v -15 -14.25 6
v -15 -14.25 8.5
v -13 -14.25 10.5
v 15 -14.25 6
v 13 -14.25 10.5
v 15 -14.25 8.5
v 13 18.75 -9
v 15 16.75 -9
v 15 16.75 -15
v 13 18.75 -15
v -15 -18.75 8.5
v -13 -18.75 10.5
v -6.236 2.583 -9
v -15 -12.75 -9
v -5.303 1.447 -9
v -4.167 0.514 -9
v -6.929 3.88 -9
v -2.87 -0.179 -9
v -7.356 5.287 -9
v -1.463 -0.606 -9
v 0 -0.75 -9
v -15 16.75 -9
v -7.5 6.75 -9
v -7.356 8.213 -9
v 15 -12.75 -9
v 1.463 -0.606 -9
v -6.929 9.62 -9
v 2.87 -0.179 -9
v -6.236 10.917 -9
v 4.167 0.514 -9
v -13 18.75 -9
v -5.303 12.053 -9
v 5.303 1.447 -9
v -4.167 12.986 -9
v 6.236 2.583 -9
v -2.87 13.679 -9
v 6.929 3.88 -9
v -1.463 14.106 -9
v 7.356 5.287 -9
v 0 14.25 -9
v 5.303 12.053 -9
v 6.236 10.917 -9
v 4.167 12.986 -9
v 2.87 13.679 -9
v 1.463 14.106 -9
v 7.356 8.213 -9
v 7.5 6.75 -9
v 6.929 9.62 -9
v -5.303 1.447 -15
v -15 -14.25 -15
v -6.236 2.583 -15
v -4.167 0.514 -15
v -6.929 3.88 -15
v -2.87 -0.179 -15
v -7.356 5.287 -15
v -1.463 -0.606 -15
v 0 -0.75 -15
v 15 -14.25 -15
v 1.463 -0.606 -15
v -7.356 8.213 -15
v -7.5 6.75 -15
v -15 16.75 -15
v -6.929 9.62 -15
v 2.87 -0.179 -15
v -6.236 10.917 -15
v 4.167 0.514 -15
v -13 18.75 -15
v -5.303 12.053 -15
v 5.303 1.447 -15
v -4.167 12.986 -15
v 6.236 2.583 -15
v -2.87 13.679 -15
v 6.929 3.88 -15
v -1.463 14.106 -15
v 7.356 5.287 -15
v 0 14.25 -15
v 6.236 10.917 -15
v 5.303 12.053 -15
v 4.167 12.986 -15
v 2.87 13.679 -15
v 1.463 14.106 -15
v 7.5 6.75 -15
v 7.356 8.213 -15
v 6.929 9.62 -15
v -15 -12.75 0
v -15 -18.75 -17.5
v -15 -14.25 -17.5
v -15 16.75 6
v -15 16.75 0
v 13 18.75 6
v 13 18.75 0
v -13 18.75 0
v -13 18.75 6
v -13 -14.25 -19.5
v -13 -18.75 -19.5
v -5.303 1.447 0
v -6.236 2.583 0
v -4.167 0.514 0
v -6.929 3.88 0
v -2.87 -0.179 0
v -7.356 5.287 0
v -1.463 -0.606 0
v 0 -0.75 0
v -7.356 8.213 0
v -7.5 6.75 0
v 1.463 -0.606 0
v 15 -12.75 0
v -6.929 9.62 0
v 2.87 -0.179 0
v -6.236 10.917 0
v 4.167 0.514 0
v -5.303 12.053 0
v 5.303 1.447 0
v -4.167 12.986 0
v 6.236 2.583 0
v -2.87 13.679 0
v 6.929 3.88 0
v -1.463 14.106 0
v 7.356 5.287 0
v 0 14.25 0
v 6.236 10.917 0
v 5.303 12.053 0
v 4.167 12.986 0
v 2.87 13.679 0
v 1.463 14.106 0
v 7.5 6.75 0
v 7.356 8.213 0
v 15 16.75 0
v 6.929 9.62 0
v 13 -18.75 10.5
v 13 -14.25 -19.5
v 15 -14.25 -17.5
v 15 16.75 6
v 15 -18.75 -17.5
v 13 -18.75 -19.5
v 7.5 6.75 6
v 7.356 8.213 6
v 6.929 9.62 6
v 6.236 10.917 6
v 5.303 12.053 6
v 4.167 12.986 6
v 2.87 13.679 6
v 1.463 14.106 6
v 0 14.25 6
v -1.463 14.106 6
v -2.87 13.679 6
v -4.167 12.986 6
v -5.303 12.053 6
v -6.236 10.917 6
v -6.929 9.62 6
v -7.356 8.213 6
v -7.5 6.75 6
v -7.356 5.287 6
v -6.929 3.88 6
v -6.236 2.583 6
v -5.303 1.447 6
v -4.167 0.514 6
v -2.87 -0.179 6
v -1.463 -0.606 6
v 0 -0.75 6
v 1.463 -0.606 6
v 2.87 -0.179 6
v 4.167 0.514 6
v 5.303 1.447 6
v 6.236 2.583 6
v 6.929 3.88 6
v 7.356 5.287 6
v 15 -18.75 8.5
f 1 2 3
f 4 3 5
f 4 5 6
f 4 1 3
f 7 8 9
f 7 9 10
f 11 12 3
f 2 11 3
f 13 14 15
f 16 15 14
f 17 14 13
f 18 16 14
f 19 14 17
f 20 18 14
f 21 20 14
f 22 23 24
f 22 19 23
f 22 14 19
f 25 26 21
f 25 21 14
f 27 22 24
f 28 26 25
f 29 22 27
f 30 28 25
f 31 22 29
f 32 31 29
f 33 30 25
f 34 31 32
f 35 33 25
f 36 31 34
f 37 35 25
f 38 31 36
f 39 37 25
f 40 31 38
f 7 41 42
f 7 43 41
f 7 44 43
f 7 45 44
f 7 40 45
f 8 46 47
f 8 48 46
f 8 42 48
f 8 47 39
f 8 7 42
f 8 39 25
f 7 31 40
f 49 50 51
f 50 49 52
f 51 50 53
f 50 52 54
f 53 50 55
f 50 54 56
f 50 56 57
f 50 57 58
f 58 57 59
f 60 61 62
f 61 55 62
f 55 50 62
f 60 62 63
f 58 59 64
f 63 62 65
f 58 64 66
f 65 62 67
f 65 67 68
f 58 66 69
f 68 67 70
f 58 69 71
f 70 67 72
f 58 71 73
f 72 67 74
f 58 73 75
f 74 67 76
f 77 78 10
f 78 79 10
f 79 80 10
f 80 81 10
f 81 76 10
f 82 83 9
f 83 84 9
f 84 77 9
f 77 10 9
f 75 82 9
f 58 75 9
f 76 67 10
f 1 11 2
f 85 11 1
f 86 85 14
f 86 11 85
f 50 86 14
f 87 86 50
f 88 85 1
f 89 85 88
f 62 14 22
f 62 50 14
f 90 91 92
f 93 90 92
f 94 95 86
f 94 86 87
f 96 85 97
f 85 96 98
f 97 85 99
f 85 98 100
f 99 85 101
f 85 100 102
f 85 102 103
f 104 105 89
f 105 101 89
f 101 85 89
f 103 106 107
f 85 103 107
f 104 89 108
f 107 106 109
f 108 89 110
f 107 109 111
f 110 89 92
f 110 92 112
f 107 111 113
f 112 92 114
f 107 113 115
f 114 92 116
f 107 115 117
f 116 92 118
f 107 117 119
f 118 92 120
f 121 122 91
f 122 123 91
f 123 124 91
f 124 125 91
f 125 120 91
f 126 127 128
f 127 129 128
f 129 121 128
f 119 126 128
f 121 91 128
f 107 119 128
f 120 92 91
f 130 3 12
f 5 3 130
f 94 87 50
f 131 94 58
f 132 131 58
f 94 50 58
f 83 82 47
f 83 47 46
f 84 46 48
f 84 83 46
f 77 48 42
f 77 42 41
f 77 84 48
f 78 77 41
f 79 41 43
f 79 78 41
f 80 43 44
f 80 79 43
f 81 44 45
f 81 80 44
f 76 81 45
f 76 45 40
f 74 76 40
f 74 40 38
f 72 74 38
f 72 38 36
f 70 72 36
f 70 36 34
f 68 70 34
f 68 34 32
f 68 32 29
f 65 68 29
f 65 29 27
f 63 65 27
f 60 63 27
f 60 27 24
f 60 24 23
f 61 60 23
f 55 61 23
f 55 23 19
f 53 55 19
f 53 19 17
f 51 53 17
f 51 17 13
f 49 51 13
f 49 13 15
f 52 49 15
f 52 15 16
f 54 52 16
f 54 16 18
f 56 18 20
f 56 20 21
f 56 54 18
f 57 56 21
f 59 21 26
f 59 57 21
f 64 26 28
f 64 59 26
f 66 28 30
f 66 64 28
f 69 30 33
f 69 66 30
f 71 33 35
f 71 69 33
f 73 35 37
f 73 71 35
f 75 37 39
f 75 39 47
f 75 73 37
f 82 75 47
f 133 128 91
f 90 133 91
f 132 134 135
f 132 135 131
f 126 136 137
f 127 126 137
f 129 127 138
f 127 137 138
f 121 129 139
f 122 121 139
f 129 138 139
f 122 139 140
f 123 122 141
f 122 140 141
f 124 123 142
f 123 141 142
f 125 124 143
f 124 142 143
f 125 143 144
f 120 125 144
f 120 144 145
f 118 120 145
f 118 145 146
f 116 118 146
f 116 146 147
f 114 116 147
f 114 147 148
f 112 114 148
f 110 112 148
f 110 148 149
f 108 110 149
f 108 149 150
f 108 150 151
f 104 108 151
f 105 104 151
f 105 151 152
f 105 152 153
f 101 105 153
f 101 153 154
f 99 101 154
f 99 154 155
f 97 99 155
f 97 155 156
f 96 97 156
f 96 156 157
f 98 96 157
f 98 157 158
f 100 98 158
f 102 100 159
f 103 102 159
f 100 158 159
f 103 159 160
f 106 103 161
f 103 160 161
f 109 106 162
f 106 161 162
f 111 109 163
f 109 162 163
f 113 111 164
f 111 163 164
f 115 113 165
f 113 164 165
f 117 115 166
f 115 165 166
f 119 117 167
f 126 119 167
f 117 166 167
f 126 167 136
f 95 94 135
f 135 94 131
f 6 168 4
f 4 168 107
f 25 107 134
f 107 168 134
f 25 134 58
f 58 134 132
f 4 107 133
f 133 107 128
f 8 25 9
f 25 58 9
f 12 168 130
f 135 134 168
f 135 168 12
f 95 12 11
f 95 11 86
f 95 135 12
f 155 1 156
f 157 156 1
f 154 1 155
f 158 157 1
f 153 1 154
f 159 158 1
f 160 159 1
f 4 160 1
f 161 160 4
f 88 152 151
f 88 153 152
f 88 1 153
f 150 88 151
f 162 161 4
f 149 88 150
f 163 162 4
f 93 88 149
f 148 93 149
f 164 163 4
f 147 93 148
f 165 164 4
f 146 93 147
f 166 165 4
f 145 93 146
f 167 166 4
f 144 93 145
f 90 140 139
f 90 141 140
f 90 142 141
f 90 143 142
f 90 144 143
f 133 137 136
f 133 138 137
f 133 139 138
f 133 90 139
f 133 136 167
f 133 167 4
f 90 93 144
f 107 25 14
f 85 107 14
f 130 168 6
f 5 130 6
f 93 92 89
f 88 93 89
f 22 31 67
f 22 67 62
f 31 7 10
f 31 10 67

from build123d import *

# Parameters (mm, degrees)
EXTRUDE_1_DEPTH            = 6
SKETCH_8_W                 = 30
SKETCH_8_H                 = 4.5
EXTRUDE_4_DEPTH            = 4.5
CHAMFER_1_SIZE             = 2
CHAMFER_2_SIZE             = 2
CUT_EXTRUDE_2_REACH        = 26.75
SKETCH_8_5_R               = 7.5
SKETCH_13_W                = 30
SKETCH_13_H                = 6
EXTRUDE_5_DEPTH            = 4.5
CHAMFER_1_OF_MIRROR_4_SIZE = 2
CHAMFER_2_OF_MIRROR_4_SIZE = 2


with BuildPart() as part:
    # 草图1 → 凸台-拉伸1 (new body)
    with BuildSketch(Plane.XY):
        Polygon((-13, 18.75), (-15, 16.75), (-15, -18.75), (15, -18.75), (15, 16.75), (13, 18.75), align=None)
    extrude_1 = extrude(amount=EXTRUDE_1_DEPTH)

    # 草图8 → 凸台-拉伸4 (add)
    with BuildSketch(Plane.XY.offset(6)):
        with Locations((0, -16.5)):
            Rectangle(SKETCH_8_W, SKETCH_8_H)
    extrude_4 = extrude(amount=EXTRUDE_4_DEPTH)

    # 倒角1
    chamfer_1_edges = [part.edges().sort_by_distance(p)[0] for p in [
        (-15, -16.5, 10.5),
    ]]
    chamfer(chamfer_1_edges, length=CHAMFER_1_SIZE)

    # 倒角2
    chamfer_2_edges = [part.edges().sort_by_distance(p)[0] for p in [
        (15, -16.5, 10.5),
    ]]
    chamfer(chamfer_2_edges, length=CHAMFER_2_SIZE)

    # 草图8<5> → 切除-拉伸2 (cut, up to next)
    with BuildSketch(Plane.XY.offset(6), mode=Mode.PRIVATE) as cut_extrude_2_sk1:
        with Locations((0, 6.75)):
            Circle(SKETCH_8_5_R)
    cut_extrude_2_tool1 = extrude(cut_extrude_2_sk1.sketch, amount=-CUT_EXTRUDE_2_REACH, mode=Mode.PRIVATE) & part.part
    cut_extrude_2 = cut_extrude_2_tool1.solids().sort_by_distance((0, 6.75, 6))[0]
    add(cut_extrude_2, mode=Mode.SUBTRACT)

    # 草图13 → 凸台-拉伸5 (add)
    with BuildSketch(Plane(origin=(0, 0, 0), x_dir=(-1, 0, 0), z_dir=(0, 0, -1))):
        with Locations((0, -15.75)):
            Rectangle(SKETCH_13_W, SKETCH_13_H)
    extrude_5 = extrude(amount=EXTRUDE_5_DEPTH)

    # 镜向4: 凸台-拉伸1, 凸台-拉伸4, 切除-拉伸2, 凸台-拉伸5 across plane
    add(extrude_1.mirror(Plane(origin=(0, 0, -4.5), x_dir=(1, 0, 0), z_dir=(0, 0, -1))))
    add(extrude_4.mirror(Plane(origin=(0, 0, -4.5), x_dir=(1, 0, 0), z_dir=(0, 0, -1))))
    add(cut_extrude_2.mirror(Plane(origin=(0, 0, -4.5), x_dir=(1, 0, 0), z_dir=(0, 0, -1))), mode=Mode.SUBTRACT)
    add(extrude_5.mirror(Plane(origin=(0, 0, -4.5), x_dir=(1, 0, 0), z_dir=(0, 0, -1))))

    # 倒角1 of 镜向4
    chamfer_1_of_mirror_4_edges = [part.edges().sort_by_distance(p)[0] for p in [
        (-15, -16.5, -19.5),
    ]]
    chamfer(chamfer_1_of_mirror_4_edges, length=CHAMFER_1_OF_MIRROR_4_SIZE)

    # 倒角2 of 镜向4
    chamfer_2_of_mirror_4_edges = [part.edges().sort_by_distance(p)[0] for p in [
        (15, -16.5, -19.5),
    ]]
    chamfer(chamfer_2_of_mirror_4_edges, length=CHAMFER_2_OF_MIRROR_4_SIZE)


solid = part.part
